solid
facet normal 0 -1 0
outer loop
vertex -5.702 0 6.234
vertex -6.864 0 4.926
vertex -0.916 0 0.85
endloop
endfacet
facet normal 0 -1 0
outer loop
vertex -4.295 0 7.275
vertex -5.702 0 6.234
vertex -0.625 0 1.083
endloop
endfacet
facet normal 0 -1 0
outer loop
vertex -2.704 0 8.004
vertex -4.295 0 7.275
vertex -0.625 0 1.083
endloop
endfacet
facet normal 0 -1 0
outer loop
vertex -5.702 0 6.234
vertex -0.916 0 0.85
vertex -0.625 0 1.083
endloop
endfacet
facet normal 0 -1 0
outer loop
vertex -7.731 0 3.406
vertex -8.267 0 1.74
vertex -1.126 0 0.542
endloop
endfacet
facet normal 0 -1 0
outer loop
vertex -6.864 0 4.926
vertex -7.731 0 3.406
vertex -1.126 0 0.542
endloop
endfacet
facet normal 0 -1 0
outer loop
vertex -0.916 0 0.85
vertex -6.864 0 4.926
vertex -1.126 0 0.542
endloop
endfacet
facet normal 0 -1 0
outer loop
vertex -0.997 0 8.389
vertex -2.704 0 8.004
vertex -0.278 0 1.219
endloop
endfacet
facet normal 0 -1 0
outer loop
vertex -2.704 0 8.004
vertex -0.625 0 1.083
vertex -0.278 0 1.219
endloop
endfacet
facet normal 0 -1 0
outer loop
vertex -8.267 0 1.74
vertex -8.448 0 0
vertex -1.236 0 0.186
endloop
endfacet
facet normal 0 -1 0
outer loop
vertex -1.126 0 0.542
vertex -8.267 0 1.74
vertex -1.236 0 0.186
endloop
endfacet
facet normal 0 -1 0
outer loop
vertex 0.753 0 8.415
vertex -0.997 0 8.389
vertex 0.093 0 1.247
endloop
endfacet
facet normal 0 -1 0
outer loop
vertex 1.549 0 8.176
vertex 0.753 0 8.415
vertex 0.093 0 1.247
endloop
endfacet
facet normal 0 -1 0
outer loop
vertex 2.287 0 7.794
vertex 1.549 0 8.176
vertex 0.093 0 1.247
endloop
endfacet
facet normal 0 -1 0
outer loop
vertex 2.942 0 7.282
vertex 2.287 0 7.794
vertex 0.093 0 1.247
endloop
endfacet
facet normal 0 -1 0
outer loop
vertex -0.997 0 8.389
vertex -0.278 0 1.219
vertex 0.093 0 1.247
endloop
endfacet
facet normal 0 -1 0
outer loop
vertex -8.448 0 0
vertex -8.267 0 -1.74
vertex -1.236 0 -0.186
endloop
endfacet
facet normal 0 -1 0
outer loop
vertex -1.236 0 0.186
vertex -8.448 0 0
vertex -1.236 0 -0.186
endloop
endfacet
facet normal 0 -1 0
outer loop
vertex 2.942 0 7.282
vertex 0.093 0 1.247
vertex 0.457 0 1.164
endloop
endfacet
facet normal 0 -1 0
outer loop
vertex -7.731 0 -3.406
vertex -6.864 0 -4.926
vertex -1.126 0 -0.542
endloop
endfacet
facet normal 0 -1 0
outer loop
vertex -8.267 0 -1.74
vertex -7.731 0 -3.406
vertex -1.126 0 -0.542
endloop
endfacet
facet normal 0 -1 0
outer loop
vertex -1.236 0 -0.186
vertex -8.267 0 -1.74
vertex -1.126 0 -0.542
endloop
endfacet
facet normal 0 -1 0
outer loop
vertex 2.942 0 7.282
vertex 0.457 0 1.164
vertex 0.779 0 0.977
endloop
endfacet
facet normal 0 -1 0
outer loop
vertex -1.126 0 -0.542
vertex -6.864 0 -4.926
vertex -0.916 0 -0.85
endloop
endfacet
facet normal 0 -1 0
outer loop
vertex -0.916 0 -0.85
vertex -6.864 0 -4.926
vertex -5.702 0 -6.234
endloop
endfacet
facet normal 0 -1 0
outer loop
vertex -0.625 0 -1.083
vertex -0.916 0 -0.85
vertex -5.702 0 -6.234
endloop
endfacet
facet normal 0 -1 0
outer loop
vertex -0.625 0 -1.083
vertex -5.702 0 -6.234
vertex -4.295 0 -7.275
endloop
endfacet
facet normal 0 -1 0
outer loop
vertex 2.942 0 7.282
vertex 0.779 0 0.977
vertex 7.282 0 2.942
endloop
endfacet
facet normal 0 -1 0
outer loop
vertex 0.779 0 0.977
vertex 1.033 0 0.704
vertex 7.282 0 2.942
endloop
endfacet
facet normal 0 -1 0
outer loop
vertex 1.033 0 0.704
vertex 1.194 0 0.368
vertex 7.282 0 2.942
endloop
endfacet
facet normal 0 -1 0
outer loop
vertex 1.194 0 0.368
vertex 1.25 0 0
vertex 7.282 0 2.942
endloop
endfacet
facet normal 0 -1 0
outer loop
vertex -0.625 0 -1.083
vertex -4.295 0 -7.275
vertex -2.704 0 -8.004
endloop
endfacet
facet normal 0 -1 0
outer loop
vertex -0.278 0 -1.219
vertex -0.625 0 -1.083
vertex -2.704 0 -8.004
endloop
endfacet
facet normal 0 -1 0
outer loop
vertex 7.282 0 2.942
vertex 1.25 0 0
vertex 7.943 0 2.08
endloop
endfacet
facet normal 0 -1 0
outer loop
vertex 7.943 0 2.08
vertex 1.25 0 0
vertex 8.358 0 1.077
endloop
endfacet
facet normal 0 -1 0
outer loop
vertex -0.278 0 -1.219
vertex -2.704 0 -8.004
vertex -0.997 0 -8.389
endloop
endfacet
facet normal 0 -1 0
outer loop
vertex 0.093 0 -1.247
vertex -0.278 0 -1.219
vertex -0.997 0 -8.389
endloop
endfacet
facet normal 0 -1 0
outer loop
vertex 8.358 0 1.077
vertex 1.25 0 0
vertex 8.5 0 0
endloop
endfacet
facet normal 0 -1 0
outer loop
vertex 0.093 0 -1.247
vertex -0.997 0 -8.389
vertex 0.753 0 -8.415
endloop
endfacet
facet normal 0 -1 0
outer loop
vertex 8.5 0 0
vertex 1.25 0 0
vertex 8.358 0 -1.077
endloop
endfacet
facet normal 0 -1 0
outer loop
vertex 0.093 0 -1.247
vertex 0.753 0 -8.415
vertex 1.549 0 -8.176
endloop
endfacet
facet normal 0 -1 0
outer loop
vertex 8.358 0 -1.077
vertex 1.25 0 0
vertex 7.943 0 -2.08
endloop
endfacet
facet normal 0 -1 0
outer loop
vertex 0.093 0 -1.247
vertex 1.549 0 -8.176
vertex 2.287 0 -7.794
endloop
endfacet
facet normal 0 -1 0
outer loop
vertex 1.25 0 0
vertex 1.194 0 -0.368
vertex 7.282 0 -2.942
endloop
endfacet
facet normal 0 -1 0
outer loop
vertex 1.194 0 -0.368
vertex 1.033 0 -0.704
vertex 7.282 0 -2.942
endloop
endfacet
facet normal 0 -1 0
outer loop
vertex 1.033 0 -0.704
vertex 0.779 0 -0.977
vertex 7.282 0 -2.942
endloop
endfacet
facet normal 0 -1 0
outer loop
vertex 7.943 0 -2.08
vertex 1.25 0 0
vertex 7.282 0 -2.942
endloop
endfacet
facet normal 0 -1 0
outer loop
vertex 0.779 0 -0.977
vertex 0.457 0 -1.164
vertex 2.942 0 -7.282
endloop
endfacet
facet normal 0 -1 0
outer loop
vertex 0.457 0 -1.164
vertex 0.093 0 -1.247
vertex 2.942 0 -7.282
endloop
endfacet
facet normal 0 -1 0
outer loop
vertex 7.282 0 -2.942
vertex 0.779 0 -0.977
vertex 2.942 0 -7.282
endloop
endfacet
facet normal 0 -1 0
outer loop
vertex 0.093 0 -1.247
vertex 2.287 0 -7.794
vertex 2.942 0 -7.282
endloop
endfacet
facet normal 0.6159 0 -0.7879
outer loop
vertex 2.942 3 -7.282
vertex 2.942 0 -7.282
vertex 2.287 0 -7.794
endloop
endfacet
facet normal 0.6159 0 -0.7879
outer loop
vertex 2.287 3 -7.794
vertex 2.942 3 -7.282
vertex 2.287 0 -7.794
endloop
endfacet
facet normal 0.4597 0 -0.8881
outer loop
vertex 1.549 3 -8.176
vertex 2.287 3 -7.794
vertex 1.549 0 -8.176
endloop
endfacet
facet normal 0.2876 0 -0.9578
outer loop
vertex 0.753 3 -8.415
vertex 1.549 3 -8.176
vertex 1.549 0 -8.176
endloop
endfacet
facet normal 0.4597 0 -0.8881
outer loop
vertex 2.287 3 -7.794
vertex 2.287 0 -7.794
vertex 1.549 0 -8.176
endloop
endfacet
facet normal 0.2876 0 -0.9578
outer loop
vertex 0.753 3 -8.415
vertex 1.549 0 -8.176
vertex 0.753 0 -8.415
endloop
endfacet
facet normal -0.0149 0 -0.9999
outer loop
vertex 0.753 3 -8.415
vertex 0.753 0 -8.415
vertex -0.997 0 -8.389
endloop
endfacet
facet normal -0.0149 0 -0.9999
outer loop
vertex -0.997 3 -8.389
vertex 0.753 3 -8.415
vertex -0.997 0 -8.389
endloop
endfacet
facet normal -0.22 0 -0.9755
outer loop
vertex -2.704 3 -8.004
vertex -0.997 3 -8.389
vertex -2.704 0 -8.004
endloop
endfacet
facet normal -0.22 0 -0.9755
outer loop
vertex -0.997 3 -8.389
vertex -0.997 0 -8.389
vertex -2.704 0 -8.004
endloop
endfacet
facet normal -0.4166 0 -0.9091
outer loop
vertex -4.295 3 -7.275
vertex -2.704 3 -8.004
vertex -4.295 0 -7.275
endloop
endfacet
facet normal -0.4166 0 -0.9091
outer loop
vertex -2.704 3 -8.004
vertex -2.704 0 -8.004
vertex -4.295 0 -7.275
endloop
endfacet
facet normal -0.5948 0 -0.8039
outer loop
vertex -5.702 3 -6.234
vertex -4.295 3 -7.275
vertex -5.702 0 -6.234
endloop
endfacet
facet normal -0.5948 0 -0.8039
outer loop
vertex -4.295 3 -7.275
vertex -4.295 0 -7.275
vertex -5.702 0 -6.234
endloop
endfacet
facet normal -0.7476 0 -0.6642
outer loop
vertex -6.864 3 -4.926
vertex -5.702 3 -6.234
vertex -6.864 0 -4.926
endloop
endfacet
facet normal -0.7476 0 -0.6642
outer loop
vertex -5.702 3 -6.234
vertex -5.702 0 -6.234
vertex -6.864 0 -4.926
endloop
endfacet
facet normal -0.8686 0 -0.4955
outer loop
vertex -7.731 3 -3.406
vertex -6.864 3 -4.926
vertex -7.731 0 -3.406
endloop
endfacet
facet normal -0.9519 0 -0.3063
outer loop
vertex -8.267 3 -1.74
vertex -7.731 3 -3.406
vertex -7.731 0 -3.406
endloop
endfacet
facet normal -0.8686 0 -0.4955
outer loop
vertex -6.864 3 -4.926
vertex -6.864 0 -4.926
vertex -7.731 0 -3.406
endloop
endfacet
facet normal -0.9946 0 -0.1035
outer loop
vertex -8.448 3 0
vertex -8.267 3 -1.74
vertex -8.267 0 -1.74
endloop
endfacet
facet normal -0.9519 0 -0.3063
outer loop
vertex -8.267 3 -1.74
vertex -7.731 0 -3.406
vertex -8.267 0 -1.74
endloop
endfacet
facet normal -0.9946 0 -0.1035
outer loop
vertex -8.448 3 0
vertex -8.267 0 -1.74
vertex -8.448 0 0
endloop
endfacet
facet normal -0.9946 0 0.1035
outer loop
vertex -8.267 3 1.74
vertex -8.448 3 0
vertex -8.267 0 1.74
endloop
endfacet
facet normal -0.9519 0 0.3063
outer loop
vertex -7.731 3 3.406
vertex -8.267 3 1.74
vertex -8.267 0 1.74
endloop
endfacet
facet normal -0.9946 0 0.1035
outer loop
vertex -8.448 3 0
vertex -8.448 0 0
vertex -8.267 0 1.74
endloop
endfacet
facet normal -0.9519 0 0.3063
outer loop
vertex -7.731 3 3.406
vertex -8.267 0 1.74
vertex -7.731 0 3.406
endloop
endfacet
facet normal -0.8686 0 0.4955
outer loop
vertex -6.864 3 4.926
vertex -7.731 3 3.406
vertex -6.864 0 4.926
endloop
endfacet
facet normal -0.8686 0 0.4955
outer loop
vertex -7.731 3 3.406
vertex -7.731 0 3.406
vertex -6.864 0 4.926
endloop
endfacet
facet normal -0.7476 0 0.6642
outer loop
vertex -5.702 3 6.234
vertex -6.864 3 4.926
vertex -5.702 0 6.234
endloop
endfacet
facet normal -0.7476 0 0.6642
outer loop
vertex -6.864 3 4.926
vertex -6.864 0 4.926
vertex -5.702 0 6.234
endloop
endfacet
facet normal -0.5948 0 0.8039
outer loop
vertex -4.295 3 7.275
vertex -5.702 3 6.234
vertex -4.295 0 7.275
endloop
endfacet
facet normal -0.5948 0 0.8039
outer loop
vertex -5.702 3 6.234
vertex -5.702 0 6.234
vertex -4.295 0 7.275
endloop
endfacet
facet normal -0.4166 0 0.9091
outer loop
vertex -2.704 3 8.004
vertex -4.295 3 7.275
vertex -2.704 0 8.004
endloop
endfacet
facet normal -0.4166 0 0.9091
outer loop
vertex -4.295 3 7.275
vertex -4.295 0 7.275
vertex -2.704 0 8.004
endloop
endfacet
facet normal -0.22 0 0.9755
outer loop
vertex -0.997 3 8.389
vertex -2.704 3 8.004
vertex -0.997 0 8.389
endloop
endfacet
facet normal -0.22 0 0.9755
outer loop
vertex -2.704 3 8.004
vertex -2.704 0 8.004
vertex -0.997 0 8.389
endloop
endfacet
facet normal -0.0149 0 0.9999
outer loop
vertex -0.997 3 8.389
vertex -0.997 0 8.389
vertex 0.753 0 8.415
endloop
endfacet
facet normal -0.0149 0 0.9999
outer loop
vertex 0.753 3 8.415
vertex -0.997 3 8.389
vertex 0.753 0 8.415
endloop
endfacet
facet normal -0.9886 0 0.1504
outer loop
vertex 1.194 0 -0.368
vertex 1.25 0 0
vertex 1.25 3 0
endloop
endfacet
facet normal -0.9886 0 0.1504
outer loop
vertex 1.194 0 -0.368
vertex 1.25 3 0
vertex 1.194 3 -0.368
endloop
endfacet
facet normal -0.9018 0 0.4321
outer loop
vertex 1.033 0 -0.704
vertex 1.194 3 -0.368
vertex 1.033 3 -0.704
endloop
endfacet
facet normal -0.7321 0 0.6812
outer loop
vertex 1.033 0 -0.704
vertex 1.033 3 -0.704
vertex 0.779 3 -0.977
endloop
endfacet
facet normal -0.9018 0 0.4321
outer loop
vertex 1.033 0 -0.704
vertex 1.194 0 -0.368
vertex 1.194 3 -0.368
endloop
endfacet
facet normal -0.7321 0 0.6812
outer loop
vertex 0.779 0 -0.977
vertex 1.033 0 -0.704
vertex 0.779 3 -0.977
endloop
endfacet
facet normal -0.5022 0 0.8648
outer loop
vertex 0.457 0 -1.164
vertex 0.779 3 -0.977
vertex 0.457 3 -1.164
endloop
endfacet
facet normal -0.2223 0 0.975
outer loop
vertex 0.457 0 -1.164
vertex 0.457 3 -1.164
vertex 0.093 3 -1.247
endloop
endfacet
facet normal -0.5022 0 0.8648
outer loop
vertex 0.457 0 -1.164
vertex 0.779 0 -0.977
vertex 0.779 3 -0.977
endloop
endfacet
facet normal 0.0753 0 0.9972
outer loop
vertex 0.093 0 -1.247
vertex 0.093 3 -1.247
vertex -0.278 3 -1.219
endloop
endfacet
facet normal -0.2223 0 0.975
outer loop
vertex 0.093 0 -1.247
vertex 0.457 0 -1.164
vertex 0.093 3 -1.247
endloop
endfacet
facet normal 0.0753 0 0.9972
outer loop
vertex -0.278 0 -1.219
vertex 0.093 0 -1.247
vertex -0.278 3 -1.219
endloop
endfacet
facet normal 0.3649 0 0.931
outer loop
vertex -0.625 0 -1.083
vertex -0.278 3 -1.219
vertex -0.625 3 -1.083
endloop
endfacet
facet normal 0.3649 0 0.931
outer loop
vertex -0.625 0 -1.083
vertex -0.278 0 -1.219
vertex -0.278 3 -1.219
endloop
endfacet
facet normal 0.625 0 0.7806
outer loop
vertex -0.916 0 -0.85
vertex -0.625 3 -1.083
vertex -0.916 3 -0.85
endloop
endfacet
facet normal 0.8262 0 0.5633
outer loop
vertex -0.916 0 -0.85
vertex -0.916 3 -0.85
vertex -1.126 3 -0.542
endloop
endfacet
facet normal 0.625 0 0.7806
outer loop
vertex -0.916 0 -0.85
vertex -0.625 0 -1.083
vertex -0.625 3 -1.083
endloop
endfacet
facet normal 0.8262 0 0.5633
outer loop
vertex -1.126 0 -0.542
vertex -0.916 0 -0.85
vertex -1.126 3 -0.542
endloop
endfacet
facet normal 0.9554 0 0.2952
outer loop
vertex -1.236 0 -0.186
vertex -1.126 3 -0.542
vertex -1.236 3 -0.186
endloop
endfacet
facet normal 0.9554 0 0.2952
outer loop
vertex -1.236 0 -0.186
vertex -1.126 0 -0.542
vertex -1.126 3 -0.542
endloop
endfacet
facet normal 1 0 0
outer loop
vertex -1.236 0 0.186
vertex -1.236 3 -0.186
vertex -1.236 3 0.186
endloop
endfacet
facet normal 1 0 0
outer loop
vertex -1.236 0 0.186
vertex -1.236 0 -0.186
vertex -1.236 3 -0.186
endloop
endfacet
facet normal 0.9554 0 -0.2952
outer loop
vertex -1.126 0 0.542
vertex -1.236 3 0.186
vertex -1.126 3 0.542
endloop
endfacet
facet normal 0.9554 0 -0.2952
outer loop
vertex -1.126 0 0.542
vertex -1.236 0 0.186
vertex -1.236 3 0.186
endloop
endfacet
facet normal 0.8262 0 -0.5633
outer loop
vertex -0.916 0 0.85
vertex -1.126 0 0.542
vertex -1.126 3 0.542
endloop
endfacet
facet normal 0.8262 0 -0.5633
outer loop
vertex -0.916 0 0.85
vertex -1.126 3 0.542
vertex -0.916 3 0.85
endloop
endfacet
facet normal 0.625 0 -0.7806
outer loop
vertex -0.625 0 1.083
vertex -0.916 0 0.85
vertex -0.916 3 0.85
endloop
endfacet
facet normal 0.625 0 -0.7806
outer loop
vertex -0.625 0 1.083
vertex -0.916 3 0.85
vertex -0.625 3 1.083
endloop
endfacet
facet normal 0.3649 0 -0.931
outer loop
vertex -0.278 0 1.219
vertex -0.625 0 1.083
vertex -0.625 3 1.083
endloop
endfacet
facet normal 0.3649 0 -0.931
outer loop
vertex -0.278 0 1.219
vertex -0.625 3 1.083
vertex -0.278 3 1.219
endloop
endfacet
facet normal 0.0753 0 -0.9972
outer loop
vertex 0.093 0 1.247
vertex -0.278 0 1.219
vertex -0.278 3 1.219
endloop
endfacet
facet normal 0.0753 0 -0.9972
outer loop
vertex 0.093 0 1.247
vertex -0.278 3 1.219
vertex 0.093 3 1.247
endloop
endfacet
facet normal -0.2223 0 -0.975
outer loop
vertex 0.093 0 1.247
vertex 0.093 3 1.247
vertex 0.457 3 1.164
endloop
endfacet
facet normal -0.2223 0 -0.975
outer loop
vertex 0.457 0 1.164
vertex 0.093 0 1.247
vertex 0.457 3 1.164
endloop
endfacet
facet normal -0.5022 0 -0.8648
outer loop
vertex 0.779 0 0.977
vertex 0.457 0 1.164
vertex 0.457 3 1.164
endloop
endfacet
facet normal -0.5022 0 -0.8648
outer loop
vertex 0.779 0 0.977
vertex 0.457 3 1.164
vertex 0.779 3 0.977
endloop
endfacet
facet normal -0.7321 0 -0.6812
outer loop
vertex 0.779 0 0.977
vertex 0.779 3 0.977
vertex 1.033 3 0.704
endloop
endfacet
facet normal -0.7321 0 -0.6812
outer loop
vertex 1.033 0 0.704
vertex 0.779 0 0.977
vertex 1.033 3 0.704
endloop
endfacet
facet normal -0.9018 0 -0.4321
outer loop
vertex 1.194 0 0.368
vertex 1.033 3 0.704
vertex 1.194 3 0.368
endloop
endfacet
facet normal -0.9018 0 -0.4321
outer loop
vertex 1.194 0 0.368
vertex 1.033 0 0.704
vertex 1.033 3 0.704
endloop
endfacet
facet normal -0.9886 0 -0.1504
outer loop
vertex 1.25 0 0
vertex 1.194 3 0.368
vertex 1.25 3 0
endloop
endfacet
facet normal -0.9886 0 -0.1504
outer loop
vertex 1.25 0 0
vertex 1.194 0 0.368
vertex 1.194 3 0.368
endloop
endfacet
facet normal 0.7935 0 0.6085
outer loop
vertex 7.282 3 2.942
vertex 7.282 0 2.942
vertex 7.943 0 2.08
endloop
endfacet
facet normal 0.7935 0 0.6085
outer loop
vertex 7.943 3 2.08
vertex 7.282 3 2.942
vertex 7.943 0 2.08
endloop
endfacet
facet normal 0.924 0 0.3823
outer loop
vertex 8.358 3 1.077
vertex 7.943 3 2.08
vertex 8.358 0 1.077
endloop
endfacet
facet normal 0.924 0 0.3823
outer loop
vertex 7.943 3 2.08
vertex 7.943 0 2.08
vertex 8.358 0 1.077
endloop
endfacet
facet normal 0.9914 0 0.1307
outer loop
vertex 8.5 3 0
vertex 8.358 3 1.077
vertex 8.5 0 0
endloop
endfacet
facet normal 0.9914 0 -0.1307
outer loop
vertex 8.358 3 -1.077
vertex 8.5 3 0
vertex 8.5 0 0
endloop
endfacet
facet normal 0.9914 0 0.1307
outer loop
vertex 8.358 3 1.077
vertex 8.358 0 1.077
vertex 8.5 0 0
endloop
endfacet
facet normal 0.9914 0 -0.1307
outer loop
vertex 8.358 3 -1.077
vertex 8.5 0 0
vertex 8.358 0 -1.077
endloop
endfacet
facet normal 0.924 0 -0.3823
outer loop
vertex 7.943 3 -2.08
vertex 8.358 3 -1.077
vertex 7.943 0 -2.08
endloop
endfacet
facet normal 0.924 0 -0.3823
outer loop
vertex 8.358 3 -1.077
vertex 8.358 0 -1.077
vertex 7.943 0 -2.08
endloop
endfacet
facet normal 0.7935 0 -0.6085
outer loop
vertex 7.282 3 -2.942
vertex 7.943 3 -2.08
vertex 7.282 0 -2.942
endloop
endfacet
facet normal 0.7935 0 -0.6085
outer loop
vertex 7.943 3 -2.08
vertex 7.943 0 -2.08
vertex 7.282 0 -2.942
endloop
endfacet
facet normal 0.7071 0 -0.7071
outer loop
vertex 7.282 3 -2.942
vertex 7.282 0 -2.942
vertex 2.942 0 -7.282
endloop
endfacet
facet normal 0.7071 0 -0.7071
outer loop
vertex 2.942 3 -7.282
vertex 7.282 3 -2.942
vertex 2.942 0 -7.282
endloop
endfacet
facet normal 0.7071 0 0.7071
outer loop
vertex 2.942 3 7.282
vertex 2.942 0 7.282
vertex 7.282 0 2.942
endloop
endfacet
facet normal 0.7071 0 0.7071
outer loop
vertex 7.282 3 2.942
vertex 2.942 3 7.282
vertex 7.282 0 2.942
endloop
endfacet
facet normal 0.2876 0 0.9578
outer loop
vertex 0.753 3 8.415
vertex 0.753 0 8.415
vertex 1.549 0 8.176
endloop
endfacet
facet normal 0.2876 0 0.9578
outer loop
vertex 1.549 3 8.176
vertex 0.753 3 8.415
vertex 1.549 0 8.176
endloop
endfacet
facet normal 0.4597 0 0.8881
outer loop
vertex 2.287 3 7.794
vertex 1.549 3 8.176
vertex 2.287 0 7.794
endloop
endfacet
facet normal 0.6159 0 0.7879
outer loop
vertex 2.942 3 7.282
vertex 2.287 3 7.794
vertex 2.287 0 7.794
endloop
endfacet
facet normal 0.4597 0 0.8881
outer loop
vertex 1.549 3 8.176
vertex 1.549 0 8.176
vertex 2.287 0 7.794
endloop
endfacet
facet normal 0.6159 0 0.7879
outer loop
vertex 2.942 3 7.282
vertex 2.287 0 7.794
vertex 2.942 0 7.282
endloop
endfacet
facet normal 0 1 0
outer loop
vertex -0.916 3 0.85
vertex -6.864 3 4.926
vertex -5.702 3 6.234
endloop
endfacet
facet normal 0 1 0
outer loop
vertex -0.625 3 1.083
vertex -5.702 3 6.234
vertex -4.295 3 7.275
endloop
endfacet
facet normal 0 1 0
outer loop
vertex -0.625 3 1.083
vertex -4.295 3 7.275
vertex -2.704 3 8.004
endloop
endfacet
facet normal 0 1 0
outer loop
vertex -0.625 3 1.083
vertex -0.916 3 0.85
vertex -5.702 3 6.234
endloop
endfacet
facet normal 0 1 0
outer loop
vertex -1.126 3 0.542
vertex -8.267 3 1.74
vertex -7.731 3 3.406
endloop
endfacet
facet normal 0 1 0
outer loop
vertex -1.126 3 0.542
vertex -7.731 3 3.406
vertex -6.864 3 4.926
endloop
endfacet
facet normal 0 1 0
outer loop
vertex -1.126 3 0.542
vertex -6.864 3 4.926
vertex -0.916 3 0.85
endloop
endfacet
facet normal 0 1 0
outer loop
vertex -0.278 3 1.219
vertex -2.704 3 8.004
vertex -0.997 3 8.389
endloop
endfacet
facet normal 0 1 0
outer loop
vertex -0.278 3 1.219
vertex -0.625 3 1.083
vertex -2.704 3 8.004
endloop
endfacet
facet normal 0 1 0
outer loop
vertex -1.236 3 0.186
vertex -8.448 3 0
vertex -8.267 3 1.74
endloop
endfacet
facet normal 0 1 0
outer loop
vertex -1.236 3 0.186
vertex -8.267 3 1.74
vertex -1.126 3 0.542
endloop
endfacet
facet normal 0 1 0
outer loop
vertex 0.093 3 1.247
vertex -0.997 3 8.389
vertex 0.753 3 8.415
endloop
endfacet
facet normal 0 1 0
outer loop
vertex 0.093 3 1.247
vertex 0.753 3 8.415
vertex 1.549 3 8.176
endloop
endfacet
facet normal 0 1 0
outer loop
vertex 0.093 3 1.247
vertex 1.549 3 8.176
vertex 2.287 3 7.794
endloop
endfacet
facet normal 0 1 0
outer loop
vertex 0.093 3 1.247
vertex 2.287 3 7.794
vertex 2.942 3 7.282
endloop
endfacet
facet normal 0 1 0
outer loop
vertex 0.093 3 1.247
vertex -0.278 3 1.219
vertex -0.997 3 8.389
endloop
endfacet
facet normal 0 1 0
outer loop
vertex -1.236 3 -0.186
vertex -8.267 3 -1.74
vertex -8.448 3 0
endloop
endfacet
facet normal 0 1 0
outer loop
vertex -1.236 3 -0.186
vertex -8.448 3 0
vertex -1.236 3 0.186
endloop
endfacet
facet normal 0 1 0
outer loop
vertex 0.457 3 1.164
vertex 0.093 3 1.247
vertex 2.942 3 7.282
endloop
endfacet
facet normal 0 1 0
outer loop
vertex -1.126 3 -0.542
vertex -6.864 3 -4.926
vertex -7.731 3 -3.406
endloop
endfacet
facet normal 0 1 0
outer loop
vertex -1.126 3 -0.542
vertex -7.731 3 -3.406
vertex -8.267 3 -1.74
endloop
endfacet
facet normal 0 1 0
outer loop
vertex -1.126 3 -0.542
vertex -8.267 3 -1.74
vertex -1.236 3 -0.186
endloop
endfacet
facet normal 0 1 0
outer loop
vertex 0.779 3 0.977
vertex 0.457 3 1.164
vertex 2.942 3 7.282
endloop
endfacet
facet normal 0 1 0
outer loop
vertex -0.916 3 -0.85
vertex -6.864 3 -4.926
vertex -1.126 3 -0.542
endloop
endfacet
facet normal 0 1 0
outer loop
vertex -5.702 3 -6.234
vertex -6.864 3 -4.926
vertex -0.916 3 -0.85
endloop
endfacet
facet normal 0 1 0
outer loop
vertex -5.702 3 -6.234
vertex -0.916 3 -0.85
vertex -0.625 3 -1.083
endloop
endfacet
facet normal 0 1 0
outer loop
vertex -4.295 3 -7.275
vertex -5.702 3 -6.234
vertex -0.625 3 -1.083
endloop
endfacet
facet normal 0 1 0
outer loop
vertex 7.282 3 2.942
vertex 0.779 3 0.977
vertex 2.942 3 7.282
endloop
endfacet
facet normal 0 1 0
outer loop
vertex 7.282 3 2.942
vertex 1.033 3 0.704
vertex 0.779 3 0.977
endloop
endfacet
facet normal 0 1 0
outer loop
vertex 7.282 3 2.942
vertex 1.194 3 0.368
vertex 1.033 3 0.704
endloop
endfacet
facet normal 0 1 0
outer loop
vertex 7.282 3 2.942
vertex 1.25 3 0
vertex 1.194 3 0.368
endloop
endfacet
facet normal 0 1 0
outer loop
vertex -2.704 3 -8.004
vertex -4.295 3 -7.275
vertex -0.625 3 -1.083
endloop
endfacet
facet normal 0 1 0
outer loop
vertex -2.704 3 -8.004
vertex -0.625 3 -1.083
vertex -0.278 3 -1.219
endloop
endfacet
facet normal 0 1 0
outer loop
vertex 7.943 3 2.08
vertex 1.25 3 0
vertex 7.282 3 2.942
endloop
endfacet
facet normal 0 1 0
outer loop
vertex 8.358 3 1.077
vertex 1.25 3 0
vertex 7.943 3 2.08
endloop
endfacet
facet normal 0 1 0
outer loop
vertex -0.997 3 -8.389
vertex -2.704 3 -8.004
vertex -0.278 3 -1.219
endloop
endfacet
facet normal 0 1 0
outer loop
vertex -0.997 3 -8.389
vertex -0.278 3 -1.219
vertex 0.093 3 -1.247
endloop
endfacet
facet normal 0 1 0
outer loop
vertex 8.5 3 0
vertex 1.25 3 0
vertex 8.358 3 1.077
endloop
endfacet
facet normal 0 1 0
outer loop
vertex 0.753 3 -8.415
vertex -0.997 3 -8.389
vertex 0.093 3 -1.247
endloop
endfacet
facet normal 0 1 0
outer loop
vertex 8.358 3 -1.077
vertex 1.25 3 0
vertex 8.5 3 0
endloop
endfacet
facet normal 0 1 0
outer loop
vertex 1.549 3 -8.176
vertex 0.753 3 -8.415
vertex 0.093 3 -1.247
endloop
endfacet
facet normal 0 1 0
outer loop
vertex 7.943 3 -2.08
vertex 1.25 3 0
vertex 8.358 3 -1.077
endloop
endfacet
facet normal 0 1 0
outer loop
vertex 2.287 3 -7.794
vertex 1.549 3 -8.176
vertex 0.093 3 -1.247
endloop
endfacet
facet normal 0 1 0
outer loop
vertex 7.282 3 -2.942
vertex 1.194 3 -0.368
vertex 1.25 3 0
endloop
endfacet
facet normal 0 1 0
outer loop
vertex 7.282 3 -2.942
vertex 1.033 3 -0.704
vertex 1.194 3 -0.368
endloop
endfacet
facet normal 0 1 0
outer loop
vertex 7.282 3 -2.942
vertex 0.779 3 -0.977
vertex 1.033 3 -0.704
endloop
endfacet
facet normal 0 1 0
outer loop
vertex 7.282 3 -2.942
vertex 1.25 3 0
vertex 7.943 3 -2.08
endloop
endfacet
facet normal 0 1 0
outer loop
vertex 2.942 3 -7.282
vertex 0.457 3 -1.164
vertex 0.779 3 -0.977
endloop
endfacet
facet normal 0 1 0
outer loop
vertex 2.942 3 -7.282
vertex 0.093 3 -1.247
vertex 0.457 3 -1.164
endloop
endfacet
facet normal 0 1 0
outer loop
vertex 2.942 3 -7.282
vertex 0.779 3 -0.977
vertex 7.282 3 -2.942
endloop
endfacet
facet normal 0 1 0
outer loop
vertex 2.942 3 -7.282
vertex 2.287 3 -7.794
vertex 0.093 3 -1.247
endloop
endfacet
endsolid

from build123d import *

# Parameters (mm, degrees)
SKETCH1_R           = 1.25
BOSS_EXTRUDE1_DEPTH = 3


with BuildPart() as part:
    # Sketch1 → Boss-Extrude1 (new body)
    with BuildSketch(Plane(origin=(0, 0, 0), x_dir=(1, 0, 0), z_dir=(0, 1, 0))):
        with BuildLine():
            ThreePointArc((0.75263713, 8.414705215), (-8.448297255, 0), (0.75263713, -8.414705215))
            ThreePointArc((0.75263713, -8.414705215), (1.926901999, -8.002285906), (2.941567446, -7.281562869))
            Line((2.941567446, -7.281562869), (7.281562869, -2.941567446))
            ThreePointArc((7.281562869, -2.941567446), (8.5, 0), (7.281562869, 2.941567446))
            Line((7.281562869, 2.941567446), (2.941567446, 7.281562869))
            ThreePointArc((2.941567446, 7.281562869), (1.926901999, 8.002285906), (0.75263713, 8.414705215))
        make_face()
        Circle(SKETCH1_R, mode=Mode.SUBTRACT)
    extrude(amount=BOSS_EXTRUDE1_DEPTH)


solid = part.part
